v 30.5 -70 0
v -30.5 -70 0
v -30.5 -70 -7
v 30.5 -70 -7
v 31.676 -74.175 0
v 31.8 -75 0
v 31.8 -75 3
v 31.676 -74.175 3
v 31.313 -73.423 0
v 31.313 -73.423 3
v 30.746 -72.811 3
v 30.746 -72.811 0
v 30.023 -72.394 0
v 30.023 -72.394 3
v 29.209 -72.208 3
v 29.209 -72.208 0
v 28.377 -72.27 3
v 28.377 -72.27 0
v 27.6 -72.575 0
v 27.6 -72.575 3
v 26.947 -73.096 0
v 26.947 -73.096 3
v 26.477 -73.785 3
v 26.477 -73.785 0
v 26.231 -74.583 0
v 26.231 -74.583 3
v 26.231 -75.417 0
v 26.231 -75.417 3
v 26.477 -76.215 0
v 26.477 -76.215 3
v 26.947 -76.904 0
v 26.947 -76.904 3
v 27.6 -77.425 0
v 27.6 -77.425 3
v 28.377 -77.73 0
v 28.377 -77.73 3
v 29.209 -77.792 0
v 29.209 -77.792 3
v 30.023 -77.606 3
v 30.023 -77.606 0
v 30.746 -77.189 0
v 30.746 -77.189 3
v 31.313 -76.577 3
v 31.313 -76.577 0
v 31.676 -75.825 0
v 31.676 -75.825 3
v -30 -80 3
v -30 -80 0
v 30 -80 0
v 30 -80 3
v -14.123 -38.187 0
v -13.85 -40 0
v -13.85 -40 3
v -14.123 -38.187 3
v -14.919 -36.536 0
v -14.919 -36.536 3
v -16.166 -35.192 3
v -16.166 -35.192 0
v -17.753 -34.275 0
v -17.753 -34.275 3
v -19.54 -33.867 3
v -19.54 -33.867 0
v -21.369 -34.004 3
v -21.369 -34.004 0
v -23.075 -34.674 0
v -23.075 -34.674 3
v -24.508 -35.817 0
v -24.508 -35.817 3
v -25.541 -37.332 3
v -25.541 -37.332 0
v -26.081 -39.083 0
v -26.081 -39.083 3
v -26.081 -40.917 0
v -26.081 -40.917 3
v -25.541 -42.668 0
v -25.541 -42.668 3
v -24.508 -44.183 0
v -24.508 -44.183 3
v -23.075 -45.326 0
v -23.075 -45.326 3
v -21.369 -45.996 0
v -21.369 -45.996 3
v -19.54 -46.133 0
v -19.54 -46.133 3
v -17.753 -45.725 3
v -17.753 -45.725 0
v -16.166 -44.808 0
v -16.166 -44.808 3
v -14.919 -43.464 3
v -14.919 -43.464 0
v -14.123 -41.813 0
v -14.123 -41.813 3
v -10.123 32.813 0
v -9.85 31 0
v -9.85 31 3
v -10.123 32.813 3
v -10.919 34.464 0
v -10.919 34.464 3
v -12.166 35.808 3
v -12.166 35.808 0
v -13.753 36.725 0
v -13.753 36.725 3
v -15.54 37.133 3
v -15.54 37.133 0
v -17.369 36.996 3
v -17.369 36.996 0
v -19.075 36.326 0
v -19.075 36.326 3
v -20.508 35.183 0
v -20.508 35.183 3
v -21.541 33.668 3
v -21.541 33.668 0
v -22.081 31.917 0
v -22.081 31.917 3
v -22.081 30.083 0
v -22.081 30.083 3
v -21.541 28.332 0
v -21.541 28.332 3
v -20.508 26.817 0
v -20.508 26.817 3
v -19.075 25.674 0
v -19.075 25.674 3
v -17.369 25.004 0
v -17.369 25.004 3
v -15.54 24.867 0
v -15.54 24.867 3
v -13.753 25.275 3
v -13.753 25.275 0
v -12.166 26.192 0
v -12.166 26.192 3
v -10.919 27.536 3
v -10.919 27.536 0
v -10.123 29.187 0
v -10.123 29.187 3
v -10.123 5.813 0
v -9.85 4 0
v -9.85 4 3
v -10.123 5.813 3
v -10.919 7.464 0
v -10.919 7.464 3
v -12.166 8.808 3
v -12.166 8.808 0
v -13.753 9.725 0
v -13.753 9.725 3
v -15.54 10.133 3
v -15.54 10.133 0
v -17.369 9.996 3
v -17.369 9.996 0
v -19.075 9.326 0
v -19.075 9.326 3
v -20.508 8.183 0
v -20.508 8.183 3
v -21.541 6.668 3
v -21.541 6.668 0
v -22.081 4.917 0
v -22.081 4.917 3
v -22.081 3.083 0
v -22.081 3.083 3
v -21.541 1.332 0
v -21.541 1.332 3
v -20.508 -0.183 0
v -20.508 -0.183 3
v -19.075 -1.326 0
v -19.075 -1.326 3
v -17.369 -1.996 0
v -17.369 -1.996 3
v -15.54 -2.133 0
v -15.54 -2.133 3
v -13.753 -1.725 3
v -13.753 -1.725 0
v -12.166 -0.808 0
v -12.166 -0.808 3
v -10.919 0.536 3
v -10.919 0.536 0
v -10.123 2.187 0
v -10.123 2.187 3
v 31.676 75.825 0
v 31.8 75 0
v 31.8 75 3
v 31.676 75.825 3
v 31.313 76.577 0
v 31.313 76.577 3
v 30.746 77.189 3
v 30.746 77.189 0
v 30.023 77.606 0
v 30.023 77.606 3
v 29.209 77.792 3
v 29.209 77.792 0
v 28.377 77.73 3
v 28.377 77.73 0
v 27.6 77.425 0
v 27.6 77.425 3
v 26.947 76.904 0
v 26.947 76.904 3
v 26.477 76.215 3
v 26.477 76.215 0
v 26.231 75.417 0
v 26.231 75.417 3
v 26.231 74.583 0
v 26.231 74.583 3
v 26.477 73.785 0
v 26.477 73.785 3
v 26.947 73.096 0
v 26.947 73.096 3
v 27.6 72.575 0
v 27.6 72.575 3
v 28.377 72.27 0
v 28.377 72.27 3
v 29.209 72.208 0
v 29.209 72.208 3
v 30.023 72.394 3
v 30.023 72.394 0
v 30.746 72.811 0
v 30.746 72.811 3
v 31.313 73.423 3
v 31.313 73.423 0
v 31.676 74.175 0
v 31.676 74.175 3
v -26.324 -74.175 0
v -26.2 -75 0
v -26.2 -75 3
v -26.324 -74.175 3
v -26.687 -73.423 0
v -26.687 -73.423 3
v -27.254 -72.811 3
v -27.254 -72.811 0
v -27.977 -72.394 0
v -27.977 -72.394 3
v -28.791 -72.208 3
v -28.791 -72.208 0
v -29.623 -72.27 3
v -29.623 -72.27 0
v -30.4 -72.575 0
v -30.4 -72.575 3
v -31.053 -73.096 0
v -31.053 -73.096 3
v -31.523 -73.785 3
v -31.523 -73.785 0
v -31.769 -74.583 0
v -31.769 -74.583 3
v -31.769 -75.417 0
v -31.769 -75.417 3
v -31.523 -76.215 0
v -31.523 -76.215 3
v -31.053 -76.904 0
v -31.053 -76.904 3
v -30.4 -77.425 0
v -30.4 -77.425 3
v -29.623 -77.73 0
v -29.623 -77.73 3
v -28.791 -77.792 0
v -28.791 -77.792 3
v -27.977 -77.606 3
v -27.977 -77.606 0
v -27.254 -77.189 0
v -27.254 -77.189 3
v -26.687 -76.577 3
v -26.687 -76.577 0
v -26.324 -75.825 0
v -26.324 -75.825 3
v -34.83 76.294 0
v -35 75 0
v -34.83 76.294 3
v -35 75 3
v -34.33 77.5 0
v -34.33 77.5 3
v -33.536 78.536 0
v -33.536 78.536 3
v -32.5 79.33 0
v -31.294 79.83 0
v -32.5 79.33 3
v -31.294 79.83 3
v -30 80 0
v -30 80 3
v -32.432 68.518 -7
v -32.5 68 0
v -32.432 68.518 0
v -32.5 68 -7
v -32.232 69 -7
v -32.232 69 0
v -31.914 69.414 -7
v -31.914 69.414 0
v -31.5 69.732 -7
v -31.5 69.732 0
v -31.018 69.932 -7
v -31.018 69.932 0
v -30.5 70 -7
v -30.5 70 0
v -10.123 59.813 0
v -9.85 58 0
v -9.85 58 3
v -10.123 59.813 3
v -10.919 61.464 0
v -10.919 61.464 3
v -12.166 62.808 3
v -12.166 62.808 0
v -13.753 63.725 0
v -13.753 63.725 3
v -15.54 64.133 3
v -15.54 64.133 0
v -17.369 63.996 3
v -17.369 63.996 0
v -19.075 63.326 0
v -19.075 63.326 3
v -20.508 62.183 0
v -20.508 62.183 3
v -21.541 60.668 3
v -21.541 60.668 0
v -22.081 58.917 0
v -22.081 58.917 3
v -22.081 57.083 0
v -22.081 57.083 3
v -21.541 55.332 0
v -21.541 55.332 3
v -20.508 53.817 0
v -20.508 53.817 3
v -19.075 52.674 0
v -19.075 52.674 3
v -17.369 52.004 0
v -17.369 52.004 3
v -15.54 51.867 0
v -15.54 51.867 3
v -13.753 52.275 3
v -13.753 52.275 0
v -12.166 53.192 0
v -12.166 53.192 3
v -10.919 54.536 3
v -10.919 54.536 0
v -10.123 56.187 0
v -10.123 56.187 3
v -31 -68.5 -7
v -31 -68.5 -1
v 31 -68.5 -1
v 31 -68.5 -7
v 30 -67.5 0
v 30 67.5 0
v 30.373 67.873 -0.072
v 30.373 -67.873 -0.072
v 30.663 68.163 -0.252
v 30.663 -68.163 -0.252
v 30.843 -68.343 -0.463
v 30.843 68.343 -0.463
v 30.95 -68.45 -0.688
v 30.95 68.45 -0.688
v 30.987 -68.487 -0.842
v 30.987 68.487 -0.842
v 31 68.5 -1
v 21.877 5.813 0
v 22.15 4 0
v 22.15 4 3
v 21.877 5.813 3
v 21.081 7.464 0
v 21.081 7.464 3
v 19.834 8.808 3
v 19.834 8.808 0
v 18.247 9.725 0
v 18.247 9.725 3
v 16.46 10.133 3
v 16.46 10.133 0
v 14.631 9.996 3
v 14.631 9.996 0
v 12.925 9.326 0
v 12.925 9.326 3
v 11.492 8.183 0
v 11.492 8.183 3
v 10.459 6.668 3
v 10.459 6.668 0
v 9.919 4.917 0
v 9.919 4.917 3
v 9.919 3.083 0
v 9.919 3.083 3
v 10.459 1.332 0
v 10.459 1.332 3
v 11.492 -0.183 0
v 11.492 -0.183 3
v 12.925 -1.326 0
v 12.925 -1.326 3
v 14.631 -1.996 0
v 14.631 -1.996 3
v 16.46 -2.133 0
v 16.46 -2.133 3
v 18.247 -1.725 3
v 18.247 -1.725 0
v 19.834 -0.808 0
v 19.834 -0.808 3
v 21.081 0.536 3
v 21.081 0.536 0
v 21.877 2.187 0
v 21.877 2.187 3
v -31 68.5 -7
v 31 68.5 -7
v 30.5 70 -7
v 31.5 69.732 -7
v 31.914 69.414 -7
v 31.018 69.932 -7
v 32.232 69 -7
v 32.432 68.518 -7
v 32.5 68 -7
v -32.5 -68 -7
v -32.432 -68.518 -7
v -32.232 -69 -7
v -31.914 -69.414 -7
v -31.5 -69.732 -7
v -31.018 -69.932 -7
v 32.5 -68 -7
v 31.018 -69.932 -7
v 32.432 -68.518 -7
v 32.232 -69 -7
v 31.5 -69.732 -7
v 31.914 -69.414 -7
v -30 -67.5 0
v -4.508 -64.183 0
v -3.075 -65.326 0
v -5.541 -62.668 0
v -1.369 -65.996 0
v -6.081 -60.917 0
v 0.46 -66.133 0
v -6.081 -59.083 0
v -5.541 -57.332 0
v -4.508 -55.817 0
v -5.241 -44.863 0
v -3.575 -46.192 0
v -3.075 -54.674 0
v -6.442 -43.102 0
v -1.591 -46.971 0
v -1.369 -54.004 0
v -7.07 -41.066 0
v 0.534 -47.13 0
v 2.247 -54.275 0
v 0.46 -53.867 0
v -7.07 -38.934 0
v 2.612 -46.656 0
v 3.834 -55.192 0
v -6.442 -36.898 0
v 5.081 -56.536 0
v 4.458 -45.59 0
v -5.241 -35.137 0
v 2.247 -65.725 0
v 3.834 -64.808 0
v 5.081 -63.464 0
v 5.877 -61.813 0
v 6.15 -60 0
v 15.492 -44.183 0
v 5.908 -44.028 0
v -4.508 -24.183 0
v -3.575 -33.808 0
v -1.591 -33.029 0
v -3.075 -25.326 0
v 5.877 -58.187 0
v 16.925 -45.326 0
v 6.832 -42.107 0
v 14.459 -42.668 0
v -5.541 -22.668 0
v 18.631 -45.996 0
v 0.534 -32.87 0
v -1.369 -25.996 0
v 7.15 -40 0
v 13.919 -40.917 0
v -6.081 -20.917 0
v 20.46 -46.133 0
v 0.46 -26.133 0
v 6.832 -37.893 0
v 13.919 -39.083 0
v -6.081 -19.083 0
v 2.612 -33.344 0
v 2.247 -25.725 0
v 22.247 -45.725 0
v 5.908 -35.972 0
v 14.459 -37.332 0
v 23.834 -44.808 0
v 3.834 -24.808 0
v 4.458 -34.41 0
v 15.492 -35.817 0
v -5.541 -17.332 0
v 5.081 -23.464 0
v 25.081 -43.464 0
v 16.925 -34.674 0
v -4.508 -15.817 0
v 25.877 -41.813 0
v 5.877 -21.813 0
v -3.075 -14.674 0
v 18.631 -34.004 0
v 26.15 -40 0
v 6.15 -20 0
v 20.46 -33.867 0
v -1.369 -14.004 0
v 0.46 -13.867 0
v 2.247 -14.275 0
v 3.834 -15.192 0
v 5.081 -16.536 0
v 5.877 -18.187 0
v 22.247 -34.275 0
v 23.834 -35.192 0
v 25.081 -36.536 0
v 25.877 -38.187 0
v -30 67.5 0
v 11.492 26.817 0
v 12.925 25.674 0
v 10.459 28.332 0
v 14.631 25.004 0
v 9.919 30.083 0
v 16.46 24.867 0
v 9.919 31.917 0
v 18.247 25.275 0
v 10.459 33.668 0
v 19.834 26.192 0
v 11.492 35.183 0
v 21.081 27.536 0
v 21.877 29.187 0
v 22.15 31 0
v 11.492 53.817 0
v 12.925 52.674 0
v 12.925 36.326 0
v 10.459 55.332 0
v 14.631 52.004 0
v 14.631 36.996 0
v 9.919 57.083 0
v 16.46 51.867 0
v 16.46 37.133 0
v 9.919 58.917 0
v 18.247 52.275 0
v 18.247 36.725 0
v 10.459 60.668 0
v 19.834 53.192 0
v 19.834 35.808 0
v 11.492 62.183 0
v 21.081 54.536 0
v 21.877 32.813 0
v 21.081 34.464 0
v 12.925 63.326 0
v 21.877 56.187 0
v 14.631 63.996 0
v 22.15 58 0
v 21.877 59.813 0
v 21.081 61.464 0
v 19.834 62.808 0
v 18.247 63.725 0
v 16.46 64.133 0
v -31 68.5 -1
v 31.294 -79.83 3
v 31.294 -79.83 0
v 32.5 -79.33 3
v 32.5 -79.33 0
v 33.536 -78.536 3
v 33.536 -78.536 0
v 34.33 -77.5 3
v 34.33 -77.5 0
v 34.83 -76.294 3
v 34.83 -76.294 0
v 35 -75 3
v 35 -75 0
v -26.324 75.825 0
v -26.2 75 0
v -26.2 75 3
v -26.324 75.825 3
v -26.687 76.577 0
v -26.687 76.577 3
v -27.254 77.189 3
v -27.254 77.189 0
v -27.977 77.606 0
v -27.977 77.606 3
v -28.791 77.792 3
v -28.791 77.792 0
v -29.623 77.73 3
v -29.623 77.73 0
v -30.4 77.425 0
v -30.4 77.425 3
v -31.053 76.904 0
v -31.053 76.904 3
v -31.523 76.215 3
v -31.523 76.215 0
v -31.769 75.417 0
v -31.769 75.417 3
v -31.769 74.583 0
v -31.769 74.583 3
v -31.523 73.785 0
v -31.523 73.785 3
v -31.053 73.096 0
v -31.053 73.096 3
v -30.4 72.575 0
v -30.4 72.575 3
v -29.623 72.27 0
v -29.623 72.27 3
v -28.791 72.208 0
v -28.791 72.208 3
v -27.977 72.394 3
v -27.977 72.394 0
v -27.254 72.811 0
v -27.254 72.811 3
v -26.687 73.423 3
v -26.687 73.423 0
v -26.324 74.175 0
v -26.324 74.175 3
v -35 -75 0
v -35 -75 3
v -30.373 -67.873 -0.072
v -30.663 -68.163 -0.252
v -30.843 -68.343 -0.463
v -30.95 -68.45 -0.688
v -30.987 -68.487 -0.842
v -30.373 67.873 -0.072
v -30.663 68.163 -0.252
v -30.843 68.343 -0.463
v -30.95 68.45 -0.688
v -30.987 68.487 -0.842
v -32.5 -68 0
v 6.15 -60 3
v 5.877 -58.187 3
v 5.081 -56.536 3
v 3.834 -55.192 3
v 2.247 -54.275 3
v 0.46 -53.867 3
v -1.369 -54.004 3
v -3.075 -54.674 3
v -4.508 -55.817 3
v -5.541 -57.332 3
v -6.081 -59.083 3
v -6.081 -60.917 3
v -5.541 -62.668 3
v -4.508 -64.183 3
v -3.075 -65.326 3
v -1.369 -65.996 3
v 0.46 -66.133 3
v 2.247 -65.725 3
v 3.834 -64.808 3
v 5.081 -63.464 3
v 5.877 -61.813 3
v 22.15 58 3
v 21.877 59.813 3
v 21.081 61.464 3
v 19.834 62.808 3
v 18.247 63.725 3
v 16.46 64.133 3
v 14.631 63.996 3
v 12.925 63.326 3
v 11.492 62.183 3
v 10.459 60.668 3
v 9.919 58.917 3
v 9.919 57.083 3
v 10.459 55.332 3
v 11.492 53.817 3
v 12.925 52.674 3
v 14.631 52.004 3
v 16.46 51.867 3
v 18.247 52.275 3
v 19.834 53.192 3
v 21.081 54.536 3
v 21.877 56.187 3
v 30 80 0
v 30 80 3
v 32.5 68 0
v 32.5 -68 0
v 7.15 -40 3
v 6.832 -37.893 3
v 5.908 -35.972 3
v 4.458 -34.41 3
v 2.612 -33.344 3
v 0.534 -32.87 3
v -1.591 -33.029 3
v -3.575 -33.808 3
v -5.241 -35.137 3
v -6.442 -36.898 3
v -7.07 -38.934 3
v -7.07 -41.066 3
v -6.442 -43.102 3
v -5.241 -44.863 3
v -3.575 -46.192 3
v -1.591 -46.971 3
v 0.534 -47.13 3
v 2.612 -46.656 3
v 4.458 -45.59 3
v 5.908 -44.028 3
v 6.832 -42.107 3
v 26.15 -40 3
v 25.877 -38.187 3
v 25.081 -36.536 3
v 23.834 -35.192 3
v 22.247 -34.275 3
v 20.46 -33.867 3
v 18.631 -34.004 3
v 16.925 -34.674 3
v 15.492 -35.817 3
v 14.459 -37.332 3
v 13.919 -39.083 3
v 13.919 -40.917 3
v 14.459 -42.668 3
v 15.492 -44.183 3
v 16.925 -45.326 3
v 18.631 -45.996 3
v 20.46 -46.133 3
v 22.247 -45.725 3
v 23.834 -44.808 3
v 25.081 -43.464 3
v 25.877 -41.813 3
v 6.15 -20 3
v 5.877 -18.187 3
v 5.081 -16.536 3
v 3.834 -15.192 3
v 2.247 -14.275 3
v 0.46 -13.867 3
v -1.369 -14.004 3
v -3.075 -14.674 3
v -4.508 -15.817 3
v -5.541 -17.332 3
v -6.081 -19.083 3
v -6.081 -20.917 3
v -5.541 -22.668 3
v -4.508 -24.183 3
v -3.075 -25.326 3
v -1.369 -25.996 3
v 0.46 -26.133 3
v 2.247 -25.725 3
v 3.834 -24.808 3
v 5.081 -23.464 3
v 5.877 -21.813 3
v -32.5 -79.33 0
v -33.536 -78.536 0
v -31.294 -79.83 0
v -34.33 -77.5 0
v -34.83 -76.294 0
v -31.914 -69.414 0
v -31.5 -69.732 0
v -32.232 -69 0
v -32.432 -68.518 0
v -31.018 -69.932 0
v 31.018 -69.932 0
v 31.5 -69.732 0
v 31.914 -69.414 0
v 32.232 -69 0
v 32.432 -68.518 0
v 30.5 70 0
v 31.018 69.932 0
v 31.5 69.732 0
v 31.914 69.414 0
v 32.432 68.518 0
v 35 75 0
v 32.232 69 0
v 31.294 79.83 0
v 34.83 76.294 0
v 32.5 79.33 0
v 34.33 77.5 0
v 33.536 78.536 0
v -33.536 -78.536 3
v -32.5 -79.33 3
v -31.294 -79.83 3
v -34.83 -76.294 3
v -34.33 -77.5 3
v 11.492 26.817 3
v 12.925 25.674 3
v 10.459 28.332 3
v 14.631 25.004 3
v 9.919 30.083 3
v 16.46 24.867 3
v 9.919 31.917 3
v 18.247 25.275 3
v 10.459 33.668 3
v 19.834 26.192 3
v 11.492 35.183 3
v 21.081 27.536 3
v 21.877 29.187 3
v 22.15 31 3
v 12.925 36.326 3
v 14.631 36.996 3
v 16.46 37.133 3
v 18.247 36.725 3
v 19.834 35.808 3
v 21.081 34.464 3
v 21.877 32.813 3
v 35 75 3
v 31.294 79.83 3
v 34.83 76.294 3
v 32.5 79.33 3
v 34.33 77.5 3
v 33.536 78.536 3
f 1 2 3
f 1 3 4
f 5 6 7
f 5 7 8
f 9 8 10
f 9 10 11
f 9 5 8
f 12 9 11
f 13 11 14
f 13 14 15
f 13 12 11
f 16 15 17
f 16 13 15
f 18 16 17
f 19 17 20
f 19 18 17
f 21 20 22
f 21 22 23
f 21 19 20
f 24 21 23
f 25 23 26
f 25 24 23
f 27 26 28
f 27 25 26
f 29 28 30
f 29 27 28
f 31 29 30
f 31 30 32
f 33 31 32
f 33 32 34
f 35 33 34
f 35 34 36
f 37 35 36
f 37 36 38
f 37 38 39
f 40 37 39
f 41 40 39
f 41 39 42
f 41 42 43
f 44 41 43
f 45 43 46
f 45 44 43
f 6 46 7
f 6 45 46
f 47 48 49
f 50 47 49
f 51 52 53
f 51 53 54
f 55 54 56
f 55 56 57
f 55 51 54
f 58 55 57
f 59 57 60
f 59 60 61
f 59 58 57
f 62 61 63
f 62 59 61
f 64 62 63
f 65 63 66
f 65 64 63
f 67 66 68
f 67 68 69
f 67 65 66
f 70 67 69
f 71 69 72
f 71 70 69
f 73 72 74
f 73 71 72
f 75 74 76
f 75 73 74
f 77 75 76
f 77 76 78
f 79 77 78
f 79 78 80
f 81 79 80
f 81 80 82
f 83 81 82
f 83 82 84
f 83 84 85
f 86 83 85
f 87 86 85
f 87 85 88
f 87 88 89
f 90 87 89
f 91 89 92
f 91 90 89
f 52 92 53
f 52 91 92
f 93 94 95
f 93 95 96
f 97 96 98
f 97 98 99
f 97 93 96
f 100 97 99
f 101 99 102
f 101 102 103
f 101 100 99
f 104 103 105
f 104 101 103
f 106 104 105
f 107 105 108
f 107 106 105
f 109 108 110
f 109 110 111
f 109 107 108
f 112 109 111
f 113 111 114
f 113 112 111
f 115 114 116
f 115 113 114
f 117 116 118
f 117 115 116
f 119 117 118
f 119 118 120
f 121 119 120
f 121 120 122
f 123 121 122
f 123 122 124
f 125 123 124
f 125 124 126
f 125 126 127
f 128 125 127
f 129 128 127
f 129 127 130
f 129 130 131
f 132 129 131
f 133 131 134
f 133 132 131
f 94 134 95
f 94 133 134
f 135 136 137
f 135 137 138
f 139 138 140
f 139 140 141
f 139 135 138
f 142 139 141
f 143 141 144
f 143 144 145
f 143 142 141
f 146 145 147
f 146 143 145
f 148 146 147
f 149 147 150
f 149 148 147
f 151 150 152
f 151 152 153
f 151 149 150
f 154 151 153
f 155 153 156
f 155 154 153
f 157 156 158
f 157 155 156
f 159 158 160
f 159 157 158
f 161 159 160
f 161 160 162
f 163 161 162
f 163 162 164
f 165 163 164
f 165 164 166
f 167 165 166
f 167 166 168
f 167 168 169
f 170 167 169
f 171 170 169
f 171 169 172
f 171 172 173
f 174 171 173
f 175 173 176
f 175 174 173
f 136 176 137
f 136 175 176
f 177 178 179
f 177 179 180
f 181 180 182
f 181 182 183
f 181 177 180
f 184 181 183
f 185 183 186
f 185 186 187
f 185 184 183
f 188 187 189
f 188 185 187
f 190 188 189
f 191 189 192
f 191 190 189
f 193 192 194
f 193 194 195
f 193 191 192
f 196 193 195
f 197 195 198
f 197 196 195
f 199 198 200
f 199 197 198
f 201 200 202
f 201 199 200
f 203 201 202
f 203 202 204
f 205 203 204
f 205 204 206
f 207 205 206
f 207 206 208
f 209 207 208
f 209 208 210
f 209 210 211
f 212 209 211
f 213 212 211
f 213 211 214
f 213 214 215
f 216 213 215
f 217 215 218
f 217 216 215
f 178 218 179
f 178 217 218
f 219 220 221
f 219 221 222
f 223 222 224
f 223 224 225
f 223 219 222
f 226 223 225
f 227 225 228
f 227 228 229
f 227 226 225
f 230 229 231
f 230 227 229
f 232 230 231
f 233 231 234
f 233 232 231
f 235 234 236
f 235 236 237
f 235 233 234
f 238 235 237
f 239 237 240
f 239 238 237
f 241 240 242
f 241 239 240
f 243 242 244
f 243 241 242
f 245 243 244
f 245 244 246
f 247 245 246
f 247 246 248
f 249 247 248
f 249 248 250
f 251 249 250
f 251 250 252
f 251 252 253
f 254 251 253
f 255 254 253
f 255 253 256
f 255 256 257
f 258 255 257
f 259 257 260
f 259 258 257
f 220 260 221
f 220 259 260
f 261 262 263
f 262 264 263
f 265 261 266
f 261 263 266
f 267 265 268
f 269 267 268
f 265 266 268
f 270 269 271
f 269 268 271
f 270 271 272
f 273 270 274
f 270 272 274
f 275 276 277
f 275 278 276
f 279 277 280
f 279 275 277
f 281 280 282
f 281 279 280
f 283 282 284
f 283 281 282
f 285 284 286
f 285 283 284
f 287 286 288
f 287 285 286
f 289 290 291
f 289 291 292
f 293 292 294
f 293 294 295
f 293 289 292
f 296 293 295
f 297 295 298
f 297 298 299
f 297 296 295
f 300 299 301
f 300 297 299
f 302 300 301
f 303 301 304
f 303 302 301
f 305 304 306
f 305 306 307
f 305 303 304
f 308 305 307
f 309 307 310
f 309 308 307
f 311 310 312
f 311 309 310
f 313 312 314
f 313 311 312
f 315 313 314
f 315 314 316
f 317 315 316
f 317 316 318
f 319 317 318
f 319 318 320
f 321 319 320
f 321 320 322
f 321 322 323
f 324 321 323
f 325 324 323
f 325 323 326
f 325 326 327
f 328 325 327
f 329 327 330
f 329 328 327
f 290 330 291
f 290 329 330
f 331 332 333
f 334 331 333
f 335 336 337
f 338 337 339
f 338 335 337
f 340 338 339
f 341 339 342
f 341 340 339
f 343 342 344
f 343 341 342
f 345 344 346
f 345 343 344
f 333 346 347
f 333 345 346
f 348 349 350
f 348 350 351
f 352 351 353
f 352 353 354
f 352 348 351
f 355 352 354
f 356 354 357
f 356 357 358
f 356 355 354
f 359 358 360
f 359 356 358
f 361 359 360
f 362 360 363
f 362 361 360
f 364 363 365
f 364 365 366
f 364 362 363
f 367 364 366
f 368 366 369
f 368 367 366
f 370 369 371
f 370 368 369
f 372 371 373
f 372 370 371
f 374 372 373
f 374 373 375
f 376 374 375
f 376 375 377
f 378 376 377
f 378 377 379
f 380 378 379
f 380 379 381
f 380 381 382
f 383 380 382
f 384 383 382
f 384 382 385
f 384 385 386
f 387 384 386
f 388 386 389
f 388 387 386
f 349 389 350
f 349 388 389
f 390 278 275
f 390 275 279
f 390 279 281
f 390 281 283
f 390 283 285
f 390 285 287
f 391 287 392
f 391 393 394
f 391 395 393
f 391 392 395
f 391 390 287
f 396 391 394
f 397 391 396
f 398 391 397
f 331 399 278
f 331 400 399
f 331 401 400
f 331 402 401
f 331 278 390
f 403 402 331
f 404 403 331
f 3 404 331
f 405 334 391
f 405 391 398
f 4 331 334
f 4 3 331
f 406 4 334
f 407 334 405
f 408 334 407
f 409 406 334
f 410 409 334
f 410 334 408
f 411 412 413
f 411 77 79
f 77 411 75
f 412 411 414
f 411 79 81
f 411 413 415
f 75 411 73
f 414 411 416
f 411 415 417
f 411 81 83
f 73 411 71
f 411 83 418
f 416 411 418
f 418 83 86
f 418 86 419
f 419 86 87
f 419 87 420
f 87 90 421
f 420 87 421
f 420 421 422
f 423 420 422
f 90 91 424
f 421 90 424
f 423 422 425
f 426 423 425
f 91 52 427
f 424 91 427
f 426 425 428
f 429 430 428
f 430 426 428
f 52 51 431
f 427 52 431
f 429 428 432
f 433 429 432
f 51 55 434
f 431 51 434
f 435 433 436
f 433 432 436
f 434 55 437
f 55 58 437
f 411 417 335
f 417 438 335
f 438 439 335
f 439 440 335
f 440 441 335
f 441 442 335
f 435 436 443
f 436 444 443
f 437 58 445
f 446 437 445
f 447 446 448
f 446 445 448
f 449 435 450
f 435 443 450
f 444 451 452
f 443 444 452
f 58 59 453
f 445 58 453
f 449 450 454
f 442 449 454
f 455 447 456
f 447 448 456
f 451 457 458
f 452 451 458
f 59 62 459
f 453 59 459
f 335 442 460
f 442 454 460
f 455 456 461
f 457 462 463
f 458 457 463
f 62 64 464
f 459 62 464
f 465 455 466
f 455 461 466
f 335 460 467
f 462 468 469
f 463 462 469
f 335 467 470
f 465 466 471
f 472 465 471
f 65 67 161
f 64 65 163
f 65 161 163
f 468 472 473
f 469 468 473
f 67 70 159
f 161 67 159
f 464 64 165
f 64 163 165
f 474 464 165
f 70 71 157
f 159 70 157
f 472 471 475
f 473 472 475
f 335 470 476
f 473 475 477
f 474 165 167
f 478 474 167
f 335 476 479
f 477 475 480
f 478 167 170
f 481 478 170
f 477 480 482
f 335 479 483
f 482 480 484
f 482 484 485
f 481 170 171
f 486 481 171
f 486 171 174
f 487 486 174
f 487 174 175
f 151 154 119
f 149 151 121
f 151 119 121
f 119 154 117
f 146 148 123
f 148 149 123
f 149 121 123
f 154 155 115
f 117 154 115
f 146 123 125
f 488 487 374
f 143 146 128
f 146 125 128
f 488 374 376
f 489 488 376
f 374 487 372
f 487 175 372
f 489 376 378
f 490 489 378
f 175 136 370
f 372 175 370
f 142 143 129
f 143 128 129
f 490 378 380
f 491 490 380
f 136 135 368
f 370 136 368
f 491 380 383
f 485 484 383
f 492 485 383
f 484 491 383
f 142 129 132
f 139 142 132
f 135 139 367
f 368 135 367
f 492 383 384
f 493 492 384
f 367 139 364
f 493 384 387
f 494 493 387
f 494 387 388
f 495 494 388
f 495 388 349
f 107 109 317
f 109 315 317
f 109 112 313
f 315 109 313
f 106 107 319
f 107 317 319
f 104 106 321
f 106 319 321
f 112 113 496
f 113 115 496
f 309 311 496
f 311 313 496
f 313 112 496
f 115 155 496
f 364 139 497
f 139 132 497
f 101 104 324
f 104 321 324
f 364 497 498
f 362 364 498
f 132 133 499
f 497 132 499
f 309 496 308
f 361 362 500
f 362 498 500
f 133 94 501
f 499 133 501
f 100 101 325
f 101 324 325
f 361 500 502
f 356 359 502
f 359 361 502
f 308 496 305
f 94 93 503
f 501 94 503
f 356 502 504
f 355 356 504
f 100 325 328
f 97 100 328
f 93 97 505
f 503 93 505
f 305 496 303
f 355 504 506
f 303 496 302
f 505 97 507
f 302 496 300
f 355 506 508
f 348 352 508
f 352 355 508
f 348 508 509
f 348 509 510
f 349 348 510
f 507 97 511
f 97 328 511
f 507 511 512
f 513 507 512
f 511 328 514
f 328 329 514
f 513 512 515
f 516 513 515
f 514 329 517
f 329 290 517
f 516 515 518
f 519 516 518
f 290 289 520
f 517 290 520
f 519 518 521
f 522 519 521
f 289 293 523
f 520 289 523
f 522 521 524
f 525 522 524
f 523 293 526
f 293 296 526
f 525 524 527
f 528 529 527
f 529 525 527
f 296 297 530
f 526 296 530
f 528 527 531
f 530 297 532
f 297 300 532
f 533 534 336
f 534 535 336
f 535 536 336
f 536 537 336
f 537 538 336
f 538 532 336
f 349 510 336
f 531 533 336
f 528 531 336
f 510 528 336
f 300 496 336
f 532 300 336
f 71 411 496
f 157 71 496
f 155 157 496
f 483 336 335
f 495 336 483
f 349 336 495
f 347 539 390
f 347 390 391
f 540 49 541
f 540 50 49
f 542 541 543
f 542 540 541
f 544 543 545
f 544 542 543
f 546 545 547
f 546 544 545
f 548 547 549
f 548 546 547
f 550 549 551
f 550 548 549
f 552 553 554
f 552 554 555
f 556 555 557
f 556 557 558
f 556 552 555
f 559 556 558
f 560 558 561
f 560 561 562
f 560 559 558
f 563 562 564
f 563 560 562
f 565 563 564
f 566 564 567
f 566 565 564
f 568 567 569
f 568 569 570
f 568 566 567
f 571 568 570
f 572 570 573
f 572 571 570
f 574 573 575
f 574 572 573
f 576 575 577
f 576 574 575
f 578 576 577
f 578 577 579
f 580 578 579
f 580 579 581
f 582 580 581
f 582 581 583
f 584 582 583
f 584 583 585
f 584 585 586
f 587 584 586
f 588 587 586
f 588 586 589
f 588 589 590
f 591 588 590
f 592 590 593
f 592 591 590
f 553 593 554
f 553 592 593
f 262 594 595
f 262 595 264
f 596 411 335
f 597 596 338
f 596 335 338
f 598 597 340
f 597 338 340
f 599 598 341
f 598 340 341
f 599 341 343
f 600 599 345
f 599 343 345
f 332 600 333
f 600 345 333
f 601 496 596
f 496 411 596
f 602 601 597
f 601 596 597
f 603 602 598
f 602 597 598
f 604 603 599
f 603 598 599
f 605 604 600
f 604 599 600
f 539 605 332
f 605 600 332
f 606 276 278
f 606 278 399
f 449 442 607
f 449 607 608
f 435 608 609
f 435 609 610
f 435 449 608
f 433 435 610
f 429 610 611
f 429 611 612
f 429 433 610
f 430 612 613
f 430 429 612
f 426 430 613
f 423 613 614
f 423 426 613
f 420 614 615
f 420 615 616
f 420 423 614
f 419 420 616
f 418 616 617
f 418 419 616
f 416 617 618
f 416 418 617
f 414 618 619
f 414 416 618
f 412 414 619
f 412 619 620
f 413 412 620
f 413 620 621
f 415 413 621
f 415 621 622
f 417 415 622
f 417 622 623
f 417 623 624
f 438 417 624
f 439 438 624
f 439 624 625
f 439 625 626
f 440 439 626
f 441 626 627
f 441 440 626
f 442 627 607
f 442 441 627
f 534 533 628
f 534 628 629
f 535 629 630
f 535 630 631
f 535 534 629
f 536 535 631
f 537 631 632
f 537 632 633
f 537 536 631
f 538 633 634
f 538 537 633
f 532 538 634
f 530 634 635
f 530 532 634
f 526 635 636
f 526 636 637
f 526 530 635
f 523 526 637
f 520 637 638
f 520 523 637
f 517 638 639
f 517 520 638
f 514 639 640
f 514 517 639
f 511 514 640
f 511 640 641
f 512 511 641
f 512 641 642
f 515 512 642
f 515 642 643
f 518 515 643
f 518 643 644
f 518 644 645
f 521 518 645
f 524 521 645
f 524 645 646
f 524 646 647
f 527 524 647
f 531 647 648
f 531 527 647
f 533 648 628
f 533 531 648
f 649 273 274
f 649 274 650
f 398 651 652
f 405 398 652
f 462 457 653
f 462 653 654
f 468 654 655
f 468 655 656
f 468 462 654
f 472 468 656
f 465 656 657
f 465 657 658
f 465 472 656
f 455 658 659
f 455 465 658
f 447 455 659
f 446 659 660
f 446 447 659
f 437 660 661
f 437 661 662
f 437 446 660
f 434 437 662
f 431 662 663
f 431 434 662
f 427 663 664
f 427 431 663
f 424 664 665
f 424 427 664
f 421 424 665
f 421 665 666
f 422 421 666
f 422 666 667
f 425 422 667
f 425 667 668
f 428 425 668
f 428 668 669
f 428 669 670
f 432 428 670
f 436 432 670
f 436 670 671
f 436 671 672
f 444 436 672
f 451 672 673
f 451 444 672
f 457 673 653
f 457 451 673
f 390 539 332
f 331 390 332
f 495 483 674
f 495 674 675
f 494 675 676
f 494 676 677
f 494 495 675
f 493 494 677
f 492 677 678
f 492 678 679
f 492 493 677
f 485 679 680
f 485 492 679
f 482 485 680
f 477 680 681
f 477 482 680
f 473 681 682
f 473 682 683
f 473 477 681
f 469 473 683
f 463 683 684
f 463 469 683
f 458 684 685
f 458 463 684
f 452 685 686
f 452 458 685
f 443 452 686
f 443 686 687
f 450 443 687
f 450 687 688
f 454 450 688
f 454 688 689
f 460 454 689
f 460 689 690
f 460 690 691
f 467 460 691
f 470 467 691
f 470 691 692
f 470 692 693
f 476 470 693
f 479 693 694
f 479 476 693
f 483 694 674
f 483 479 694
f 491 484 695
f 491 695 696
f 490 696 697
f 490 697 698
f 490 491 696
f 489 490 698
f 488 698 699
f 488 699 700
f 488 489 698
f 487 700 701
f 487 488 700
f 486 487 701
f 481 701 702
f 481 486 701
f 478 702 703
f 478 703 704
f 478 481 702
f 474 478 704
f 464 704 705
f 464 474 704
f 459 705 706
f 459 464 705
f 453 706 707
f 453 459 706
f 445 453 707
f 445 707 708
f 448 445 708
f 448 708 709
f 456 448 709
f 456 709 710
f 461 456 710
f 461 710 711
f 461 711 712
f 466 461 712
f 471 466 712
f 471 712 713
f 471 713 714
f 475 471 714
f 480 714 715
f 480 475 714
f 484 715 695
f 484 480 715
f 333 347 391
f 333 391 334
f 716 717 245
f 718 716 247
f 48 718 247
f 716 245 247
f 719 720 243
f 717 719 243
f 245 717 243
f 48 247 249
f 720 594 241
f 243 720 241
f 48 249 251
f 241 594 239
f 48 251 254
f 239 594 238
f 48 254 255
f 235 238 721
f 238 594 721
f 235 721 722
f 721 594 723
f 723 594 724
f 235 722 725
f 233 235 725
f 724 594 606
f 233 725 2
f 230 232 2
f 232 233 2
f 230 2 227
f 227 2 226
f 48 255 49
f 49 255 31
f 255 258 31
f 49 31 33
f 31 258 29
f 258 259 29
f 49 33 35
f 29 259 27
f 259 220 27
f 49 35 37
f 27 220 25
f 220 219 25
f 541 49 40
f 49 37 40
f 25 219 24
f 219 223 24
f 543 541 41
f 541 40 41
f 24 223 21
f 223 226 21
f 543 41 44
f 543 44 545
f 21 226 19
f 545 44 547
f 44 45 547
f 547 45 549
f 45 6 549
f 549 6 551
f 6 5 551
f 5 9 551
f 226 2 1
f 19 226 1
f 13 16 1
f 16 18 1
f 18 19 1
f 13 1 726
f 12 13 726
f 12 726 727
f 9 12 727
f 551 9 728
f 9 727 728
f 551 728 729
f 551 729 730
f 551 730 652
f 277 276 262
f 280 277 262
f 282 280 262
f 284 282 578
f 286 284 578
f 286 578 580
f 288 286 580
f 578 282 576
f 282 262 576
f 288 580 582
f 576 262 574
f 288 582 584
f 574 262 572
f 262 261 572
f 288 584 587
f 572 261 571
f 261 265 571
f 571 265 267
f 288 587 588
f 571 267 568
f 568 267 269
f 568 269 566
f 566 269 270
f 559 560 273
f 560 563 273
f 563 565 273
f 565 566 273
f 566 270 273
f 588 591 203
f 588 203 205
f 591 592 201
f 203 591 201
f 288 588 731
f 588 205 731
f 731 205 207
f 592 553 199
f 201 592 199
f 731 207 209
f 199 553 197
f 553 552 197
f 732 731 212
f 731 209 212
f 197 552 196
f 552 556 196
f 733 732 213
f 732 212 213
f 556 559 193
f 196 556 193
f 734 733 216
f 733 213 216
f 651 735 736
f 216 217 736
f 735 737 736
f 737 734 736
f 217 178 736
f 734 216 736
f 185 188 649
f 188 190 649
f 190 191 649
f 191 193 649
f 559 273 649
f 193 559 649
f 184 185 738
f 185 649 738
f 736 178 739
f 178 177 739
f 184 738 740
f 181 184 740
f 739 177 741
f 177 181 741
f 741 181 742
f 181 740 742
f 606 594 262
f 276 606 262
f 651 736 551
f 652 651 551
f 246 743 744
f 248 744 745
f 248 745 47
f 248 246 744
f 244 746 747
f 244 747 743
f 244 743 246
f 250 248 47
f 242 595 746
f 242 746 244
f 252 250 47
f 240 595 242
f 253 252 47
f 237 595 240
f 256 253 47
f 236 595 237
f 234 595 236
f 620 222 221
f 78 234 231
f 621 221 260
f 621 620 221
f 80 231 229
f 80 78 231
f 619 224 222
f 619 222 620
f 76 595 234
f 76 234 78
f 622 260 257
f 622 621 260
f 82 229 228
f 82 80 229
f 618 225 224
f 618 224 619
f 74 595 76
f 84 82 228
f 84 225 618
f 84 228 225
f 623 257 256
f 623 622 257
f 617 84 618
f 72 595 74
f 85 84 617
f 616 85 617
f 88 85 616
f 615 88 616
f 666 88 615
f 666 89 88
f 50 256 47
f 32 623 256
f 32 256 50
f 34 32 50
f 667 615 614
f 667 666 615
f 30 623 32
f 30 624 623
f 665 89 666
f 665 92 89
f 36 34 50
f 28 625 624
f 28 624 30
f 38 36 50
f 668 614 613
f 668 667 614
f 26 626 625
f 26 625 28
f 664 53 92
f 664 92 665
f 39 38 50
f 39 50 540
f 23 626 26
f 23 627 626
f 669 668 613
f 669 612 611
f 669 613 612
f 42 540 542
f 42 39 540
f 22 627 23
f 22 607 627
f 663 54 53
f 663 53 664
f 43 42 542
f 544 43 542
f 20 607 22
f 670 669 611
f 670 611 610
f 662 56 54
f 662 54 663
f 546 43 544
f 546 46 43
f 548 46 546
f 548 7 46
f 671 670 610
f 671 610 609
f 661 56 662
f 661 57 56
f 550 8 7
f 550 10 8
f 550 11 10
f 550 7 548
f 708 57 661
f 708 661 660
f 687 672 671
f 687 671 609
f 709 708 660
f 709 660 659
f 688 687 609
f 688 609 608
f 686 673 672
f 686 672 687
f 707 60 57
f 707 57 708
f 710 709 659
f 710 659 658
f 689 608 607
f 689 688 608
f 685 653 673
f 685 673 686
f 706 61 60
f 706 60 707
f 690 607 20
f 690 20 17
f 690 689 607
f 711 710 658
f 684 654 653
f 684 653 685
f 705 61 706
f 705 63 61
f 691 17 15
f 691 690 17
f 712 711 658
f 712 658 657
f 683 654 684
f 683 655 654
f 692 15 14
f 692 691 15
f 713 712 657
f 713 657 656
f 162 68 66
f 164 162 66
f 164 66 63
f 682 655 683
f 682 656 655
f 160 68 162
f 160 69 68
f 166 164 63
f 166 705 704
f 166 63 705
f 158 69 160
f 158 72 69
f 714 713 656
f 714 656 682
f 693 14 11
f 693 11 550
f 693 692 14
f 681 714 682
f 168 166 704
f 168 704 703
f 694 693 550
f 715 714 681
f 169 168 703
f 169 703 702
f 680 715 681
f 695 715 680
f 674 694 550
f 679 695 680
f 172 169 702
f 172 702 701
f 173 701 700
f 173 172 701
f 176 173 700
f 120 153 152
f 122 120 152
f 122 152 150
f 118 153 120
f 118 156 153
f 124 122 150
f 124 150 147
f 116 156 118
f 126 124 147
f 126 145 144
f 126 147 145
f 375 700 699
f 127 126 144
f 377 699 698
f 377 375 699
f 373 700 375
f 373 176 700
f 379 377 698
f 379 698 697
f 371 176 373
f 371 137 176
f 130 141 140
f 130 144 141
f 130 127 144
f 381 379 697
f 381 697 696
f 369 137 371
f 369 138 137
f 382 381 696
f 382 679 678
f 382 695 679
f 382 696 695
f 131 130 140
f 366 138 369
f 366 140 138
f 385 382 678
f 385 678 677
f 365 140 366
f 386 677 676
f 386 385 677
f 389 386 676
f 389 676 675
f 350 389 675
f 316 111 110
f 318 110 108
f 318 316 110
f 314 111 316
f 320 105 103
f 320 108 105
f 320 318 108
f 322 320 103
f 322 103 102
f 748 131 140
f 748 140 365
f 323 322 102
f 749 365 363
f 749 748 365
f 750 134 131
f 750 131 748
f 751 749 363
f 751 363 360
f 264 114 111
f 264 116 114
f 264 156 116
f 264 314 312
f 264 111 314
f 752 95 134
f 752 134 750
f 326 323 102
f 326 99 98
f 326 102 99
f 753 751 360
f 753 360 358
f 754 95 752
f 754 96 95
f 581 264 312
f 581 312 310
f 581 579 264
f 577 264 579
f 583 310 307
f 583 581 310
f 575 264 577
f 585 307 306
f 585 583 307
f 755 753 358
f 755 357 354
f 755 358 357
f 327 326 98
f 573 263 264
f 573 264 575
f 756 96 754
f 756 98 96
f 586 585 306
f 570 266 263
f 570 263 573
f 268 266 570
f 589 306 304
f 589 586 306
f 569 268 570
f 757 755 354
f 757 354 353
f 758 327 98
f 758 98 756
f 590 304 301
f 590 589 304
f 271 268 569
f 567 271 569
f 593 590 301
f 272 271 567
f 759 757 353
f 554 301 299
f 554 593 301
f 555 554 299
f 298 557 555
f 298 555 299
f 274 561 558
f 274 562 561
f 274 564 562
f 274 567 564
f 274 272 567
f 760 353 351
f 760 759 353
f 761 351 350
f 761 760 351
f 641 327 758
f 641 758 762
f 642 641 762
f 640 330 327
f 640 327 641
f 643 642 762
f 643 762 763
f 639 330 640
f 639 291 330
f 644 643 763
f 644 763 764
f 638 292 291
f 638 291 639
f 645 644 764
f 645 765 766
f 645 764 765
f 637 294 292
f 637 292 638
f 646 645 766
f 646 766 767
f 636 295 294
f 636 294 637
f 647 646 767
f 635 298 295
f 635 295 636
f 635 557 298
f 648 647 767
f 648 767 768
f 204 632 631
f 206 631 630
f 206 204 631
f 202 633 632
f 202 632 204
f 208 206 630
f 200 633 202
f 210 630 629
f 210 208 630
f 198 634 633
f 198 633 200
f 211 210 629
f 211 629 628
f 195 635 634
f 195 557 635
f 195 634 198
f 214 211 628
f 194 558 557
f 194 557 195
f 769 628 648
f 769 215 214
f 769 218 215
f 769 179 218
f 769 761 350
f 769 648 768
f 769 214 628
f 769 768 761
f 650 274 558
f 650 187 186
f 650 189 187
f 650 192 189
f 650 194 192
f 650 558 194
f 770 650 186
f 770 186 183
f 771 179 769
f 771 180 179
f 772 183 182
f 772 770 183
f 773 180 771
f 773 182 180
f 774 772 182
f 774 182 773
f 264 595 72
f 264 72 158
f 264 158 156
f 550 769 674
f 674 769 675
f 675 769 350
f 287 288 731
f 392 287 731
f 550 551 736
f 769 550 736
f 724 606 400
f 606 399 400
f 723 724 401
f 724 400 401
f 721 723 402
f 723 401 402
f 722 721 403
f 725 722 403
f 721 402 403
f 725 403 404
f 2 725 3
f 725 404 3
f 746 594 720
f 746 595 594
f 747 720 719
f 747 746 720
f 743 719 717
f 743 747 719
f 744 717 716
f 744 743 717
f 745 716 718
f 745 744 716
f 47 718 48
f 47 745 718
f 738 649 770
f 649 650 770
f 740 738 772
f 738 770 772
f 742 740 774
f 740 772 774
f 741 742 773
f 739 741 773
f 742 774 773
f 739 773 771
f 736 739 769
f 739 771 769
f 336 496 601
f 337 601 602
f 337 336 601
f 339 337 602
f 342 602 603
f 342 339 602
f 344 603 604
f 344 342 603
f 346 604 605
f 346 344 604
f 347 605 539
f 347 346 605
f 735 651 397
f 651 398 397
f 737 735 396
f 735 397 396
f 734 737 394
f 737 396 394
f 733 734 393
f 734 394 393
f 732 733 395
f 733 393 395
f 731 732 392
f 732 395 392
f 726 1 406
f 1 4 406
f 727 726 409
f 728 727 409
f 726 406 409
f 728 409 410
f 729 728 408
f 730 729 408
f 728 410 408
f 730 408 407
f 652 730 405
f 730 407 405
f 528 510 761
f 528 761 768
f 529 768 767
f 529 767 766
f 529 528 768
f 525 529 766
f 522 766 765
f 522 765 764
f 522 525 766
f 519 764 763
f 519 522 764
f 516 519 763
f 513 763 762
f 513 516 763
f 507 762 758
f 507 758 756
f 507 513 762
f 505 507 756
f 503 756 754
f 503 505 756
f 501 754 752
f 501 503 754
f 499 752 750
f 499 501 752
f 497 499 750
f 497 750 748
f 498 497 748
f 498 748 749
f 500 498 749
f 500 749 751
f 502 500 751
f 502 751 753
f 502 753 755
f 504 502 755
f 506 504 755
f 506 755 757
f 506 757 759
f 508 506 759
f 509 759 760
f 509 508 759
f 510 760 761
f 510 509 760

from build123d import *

# Parameters (mm, degrees)
SKETCH046_W   = 70
SKETCH046_H   = 160
SKETCH046_R   = 2.8
SKETCH046_R_2 = 6.15
SKETCH046_R_3 = 7.15
PAD021_DEPTH  = 3
SKETCH047_W   = 65
SKETCH047_H   = 140
SKETCH047_W_2 = 62
SKETCH047_H_2 = 137
PAD022_DEPTH  = 7
FILLET018_R   = 1
FILLET019_R   = 5
FILLET020_R   = 2


with BuildPart() as part:
    # Sketch046 → Pad021 (new body)
    with BuildSketch(Plane.XY):
        Rectangle(SKETCH046_W, SKETCH046_H)
        with Locations((-29, 75)):
            Circle(SKETCH046_R, mode=Mode.SUBTRACT)
        with Locations((29, 75)):
            Circle(SKETCH046_R, mode=Mode.SUBTRACT)
        with Locations((-29, -75)):
            Circle(SKETCH046_R, mode=Mode.SUBTRACT)
        with Locations((29, -75)):
            Circle(SKETCH046_R, mode=Mode.SUBTRACT)
        with Locations((0, -60)):
            Circle(SKETCH046_R_2, mode=Mode.SUBTRACT)
        with Locations((0, -20)):
            Circle(SKETCH046_R_2, mode=Mode.SUBTRACT)
        with Locations((0, -40)):
            Circle(SKETCH046_R_3, mode=Mode.SUBTRACT)
        with Locations((20, -40)):
            Circle(SKETCH046_R_2, mode=Mode.SUBTRACT)
        with Locations((-20, -40)):
            Circle(SKETCH046_R_2, mode=Mode.SUBTRACT)
        with Locations((-16, 58)):
            Circle(SKETCH046_R_2, mode=Mode.SUBTRACT)
        with Locations((16, 58)):
            Circle(SKETCH046_R_2, mode=Mode.SUBTRACT)
        with Locations((-16, 31)):
            Circle(SKETCH046_R_2, mode=Mode.SUBTRACT)
        with Locations((16, 31)):
            Circle(SKETCH046_R_2, mode=Mode.SUBTRACT)
        with Locations((-16, 4)):
            Circle(SKETCH046_R_2, mode=Mode.SUBTRACT)
        with Locations((16, 4)):
            Circle(SKETCH046_R_2, mode=Mode.SUBTRACT)
    extrude(amount=PAD021_DEPTH)

    # Sketch047 (on Face20 of Pad021) → Pad022 (join)
    with BuildSketch(Plane(origin=(0, 0, 0), x_dir=(1, 0, 0), z_dir=(0, 0, -1))):
        Rectangle(SKETCH047_W, SKETCH047_H)
        Rectangle(SKETCH047_W_2, SKETCH047_H_2, mode=Mode.SUBTRACT)
    extrude(amount=PAD022_DEPTH)

    # Fillet018
    fillet018_edges = [part.edges().sort_by_distance(p)[0] for p in [
        (0, 68.5, 0),
        (31, 0, 0),
        (-31, 0, 0),
        (0, -68.5, 0),
    ]]
    fillet(fillet018_edges, radius=FILLET018_R)

    # Fillet019
    fillet019_edges = [part.edges().sort_by_distance(p)[0] for p in [
        (-35, 80, 1.5),
        (35, 80, 1.5),
        (-35, -80, 1.5),
        (35, -80, 1.5),
    ]]
    fillet(fillet019_edges, radius=FILLET019_R)

    # Fillet020
    fillet020_edges = [part.edges().sort_by_distance(p)[0] for p in [
        (-32.5, -70, -3.5),
        (32.5, -70, -3.5),
        (-32.5, 70, -3.5),
        (32.5, 70, -3.5),
    ]]
    fillet(fillet020_edges, radius=FILLET020_R)


solid = part.part
